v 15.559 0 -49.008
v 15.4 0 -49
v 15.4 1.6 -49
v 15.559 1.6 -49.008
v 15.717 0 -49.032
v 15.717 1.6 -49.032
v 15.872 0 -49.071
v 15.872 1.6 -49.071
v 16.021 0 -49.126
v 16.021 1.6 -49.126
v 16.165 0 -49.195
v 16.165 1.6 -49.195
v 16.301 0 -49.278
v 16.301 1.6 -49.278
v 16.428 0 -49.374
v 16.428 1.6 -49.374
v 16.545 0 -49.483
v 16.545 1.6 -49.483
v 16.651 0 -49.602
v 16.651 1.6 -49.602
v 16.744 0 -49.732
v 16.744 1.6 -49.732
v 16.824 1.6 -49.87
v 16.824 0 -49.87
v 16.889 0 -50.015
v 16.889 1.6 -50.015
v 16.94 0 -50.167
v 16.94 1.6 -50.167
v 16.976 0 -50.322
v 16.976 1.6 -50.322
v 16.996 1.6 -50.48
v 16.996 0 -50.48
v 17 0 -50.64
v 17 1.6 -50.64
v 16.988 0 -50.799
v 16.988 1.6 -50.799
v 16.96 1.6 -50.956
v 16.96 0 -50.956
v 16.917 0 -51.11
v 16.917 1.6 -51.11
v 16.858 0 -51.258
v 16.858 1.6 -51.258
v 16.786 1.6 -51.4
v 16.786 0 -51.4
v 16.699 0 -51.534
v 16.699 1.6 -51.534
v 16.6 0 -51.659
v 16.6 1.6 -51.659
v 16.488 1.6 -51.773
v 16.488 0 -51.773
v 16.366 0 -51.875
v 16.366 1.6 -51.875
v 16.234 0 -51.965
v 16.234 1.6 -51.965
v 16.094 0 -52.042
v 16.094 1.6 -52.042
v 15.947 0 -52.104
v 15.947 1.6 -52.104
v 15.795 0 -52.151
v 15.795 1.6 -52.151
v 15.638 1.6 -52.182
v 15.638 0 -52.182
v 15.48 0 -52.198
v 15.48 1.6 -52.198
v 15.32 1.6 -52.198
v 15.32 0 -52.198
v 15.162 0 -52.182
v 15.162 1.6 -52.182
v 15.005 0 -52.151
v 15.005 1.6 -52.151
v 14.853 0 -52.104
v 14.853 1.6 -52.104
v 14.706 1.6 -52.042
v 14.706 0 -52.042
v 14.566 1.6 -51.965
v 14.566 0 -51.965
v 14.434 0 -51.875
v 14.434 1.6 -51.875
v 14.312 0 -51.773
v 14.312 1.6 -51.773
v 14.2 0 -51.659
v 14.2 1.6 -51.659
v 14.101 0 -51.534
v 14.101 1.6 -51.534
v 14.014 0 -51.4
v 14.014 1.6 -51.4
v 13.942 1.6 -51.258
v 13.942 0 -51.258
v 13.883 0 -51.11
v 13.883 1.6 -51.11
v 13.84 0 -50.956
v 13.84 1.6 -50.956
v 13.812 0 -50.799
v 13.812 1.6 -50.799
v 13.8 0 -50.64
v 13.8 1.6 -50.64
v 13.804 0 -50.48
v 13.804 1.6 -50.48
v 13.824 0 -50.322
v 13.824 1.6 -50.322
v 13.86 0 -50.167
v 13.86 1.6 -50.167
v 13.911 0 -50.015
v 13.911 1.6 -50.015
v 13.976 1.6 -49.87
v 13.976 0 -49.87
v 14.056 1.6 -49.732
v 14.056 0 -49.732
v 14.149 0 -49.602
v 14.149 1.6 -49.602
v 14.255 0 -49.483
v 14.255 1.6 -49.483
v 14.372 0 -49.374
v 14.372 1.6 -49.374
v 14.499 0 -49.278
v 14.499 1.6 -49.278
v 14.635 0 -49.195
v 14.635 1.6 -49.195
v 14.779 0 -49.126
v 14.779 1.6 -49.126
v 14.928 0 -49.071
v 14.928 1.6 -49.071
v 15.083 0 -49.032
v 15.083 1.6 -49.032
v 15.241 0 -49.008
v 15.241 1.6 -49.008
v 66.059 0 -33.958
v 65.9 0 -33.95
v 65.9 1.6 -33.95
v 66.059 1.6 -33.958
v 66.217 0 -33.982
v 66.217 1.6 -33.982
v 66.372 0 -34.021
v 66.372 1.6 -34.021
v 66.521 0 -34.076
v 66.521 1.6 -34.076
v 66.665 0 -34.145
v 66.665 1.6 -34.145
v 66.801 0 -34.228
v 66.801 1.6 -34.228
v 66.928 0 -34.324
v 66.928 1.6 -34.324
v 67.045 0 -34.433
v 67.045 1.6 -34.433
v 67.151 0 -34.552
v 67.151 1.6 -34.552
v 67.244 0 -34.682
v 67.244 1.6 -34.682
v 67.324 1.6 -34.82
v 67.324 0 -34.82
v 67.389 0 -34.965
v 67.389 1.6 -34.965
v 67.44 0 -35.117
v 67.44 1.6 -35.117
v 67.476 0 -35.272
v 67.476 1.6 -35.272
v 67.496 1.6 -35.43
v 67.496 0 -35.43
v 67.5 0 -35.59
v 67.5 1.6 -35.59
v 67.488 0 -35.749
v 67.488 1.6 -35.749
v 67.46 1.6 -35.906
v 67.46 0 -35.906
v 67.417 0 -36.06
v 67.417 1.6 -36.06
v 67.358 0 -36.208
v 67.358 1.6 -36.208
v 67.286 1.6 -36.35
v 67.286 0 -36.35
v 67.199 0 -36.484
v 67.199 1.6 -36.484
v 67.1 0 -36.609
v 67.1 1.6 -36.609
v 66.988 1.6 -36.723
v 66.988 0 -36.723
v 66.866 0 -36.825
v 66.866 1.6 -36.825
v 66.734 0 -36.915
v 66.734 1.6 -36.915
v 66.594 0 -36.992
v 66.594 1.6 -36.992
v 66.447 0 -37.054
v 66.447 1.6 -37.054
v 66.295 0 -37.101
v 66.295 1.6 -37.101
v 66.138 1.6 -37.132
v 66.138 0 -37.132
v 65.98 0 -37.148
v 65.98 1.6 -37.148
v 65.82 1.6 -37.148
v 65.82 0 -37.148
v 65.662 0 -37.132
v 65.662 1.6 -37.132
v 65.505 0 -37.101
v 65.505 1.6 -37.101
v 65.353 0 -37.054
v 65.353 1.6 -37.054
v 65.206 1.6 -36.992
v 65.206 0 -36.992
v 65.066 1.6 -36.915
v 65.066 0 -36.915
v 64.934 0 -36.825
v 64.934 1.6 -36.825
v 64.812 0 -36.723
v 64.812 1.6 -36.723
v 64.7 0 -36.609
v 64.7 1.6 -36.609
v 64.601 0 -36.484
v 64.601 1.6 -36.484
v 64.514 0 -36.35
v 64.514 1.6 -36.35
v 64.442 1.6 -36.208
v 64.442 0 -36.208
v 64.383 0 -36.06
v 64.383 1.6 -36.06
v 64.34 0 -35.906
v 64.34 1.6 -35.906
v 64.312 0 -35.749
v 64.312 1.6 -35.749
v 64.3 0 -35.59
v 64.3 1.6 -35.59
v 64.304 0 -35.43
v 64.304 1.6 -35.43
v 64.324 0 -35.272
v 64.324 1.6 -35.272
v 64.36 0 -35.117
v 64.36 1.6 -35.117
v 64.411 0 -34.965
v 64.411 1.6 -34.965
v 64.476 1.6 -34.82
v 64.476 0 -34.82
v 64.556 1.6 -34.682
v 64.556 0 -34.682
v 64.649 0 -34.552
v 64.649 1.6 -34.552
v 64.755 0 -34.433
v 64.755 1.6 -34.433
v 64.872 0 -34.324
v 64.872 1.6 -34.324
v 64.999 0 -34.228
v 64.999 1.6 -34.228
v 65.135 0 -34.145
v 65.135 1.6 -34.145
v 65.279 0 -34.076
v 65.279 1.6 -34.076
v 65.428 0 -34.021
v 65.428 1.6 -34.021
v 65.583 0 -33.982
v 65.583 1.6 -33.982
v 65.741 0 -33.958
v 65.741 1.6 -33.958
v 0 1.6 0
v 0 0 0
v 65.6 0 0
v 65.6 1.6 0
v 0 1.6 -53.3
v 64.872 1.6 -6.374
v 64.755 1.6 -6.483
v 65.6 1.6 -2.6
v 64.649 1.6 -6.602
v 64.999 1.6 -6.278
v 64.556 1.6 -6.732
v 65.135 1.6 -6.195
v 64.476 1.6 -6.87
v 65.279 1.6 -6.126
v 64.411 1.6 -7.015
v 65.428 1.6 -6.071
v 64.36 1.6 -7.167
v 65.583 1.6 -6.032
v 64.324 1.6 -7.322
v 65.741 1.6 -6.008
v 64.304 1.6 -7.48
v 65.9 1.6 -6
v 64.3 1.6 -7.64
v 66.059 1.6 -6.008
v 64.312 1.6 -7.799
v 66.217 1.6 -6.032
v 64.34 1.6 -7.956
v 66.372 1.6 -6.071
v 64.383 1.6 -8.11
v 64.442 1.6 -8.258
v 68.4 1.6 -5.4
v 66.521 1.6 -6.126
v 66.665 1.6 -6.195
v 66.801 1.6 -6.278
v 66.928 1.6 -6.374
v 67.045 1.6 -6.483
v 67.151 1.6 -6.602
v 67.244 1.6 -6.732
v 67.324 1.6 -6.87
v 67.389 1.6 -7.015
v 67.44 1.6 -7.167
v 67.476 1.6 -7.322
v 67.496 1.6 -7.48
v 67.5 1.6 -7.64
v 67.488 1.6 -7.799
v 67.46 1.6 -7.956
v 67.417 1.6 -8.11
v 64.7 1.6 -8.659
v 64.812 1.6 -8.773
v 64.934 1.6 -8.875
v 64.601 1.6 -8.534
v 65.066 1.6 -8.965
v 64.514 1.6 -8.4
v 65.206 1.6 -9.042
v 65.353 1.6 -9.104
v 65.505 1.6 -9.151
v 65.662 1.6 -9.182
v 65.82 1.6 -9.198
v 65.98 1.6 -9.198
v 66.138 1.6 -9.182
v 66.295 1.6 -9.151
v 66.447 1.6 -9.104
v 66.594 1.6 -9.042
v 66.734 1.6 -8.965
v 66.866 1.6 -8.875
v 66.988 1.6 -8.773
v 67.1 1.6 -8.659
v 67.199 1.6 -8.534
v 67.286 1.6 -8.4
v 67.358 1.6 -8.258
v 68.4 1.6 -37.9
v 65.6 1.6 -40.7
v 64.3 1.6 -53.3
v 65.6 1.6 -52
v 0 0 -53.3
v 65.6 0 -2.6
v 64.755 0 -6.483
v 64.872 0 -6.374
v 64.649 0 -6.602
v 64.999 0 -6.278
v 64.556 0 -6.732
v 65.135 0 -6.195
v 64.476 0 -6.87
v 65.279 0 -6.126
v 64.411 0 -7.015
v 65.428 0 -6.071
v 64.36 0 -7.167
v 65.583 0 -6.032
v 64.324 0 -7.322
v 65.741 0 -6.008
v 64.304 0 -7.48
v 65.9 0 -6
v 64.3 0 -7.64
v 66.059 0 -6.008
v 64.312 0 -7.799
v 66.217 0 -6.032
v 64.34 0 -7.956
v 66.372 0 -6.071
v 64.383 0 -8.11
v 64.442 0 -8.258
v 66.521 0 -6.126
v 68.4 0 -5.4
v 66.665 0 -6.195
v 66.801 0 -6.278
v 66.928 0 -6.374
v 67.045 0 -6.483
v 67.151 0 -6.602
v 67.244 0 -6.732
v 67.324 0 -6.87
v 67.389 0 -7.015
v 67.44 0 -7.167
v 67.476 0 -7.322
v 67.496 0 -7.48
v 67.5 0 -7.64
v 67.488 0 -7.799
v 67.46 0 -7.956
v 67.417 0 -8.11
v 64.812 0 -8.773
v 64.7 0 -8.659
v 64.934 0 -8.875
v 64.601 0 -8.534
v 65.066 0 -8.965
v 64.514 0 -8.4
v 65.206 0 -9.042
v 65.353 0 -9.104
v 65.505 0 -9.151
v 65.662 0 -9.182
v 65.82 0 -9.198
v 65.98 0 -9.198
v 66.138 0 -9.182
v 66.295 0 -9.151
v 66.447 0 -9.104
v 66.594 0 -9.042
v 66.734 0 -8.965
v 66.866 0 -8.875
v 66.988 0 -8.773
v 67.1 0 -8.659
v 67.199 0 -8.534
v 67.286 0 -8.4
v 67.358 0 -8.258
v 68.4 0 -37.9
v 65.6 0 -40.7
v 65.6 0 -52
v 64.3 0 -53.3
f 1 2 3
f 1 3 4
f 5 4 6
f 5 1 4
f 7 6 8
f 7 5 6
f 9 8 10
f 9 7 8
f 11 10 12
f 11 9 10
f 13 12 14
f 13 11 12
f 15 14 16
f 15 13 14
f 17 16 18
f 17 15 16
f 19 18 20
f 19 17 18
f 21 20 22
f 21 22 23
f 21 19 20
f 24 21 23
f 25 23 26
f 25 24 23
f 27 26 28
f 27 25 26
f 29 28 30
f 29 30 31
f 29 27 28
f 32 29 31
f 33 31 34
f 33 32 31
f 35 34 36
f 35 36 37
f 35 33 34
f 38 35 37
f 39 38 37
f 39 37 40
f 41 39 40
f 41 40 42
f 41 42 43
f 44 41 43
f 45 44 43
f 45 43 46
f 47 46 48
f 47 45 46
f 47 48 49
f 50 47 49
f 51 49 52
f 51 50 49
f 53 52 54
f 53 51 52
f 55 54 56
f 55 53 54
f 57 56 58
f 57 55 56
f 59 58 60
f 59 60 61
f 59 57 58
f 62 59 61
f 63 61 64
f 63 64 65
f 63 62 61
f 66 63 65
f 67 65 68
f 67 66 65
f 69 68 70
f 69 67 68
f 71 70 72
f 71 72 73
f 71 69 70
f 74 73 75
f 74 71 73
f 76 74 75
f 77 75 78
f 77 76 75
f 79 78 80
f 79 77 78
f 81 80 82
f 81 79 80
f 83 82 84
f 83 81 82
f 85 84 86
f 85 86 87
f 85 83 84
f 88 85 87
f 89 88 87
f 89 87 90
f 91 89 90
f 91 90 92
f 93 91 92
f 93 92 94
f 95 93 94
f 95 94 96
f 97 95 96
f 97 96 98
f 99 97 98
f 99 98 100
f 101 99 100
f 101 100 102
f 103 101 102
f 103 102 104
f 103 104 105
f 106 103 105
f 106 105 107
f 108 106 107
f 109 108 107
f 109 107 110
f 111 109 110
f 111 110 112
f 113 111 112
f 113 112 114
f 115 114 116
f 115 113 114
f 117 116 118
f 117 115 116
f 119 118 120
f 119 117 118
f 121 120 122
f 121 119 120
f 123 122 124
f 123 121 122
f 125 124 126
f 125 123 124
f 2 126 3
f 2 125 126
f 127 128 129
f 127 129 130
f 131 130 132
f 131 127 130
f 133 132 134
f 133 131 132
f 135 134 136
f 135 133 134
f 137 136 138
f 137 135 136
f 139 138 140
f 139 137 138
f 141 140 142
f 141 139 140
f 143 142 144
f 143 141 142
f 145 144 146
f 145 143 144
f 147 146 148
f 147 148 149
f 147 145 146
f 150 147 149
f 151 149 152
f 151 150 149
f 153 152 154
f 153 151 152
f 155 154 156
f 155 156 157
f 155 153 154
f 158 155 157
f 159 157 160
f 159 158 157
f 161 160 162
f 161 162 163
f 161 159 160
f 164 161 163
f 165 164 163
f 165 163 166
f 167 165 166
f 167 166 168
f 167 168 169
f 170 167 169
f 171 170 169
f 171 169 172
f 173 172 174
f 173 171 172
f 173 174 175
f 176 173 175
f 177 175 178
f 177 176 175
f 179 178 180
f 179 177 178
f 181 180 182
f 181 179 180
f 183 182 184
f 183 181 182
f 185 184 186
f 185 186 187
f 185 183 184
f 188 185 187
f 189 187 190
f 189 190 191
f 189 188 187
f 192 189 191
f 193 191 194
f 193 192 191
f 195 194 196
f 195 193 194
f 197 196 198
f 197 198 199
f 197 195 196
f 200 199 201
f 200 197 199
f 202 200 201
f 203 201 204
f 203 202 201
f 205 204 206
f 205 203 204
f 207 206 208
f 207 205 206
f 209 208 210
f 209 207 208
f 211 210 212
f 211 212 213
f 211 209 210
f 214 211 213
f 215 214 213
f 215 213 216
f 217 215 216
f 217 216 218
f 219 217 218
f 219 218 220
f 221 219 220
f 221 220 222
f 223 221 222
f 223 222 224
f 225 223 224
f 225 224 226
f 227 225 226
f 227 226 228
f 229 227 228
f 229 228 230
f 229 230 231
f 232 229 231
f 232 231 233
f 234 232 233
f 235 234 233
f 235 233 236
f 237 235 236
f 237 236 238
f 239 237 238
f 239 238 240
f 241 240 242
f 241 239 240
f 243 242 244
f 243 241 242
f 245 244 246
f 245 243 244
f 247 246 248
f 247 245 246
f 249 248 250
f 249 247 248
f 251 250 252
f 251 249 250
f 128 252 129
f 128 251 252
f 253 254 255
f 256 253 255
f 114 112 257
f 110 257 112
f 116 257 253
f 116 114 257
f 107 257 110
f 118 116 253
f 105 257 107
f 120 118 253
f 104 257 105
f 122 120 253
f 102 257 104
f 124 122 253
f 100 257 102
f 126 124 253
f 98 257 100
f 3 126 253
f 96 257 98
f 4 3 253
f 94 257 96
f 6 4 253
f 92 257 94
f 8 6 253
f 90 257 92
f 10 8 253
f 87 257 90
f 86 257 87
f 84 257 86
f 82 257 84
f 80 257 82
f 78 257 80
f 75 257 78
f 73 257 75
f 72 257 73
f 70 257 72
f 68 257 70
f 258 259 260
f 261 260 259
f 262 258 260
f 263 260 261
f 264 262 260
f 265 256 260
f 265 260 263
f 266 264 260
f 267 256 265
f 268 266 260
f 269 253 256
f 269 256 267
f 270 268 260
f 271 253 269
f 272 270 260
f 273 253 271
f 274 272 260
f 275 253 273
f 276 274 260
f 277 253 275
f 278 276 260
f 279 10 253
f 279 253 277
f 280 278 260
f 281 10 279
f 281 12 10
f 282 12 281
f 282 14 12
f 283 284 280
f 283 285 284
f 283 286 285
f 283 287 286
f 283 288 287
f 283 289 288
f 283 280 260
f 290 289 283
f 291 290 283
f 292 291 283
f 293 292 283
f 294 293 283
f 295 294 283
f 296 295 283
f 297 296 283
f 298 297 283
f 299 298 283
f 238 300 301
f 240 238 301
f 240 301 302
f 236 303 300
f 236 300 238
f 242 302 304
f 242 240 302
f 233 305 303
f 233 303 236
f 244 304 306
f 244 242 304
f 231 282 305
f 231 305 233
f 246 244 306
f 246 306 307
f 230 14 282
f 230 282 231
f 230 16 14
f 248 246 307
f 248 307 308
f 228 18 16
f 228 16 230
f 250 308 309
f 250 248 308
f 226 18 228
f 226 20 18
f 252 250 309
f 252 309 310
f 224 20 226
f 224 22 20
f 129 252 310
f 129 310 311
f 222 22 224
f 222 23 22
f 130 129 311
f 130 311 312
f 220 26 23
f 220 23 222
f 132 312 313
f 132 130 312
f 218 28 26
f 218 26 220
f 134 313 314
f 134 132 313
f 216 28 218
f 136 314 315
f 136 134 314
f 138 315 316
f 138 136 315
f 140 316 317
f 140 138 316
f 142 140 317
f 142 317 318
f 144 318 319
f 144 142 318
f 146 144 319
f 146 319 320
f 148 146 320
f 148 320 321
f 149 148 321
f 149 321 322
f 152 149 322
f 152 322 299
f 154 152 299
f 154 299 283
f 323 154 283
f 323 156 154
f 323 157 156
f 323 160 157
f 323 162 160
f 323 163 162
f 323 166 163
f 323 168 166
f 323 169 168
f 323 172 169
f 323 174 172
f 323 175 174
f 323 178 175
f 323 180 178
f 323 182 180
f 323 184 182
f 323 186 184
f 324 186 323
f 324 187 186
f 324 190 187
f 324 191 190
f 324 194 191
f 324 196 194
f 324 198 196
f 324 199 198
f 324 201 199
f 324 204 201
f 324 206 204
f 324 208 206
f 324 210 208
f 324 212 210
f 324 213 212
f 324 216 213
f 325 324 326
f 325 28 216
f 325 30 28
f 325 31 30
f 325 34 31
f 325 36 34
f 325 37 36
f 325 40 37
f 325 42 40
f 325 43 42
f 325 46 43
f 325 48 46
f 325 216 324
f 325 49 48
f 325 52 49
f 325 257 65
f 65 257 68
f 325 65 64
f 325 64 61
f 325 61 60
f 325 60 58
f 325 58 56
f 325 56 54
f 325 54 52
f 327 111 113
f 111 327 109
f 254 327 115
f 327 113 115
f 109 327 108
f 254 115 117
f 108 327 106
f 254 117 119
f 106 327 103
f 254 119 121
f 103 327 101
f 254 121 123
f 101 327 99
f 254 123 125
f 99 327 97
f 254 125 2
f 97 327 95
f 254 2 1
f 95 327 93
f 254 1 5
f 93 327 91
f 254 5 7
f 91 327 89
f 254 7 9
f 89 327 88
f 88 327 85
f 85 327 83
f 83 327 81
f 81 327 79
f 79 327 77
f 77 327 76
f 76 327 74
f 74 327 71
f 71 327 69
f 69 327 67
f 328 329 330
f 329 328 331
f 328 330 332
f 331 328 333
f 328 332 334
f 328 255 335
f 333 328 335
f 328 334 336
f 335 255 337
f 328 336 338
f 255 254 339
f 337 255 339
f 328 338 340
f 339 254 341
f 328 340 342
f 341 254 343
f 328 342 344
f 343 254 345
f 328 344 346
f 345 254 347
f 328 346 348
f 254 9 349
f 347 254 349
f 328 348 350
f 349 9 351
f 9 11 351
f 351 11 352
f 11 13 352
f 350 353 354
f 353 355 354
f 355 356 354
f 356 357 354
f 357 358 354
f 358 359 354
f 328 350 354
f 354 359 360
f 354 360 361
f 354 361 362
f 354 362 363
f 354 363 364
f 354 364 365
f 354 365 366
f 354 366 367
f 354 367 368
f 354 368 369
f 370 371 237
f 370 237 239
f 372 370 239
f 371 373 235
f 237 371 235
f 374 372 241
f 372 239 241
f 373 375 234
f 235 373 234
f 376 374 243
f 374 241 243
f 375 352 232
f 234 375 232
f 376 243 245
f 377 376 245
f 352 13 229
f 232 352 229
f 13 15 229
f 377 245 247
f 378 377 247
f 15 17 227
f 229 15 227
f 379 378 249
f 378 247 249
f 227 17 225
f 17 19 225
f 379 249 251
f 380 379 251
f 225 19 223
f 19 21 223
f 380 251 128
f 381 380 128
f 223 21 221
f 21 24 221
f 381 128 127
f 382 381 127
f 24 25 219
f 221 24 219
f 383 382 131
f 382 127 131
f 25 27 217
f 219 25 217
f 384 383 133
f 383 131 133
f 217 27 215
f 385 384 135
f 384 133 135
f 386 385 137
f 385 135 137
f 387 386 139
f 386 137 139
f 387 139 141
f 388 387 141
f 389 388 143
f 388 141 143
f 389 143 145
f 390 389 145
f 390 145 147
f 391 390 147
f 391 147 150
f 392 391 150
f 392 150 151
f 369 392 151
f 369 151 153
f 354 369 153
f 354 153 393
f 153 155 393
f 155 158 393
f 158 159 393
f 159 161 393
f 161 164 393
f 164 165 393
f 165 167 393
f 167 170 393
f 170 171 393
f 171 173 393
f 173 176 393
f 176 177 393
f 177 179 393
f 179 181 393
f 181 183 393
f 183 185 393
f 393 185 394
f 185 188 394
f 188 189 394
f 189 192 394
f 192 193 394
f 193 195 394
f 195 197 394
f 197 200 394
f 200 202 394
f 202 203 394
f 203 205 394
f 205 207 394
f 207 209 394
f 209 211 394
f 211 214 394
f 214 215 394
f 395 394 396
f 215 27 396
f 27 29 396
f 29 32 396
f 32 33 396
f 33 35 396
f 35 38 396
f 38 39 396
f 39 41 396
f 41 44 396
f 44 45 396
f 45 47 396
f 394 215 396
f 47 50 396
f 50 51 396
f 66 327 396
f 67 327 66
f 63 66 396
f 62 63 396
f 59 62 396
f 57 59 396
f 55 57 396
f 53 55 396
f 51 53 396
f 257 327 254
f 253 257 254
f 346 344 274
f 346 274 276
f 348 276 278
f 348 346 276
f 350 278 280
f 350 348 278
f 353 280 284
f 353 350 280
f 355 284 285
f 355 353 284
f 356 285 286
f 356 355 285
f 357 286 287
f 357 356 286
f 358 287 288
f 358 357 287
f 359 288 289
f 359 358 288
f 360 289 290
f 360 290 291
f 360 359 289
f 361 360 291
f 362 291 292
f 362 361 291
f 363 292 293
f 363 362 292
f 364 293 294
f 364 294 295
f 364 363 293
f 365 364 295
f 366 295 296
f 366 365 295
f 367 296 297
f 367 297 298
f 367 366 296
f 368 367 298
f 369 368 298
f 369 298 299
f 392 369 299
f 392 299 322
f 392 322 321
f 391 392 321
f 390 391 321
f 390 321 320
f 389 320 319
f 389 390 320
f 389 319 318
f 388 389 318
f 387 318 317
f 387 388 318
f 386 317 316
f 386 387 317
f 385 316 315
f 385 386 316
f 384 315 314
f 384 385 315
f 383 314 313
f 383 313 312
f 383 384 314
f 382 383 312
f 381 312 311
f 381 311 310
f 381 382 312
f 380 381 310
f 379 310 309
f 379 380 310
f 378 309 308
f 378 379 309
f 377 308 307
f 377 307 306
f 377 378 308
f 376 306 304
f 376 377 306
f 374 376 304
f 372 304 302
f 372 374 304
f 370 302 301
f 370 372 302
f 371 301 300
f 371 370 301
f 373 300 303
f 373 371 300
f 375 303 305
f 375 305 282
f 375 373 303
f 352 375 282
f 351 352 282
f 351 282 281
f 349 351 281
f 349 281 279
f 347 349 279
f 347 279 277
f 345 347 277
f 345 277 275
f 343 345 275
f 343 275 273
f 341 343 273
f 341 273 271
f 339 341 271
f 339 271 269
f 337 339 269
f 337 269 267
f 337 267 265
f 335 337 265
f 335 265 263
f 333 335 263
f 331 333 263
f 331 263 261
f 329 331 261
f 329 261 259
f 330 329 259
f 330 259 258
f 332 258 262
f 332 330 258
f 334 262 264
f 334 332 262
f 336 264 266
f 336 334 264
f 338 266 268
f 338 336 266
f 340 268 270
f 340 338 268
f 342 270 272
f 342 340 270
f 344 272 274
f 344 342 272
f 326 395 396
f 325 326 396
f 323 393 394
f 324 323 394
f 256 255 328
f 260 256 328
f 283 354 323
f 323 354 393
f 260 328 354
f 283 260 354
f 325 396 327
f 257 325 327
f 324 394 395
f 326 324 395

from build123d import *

# Parameters (mm, degrees)
SKETCH1_R           = 1.6
BOSS_EXTRUDE1_DEPTH = 1.6


with BuildPart() as part:
    # Sketch1 → Boss-Extrude1 (new body)
    with BuildSketch(Plane(origin=(0, 0, 0), x_dir=(1, 0, 0), z_dir=(0, 1, 0))):
        Polygon((65.6, 0), (65.6, 2.6), (68.4, 5.4), (68.4, 37.9), (65.6, 40.7), (65.6, 52), (64.3, 53.3), (0, 53.3), (0, 0), align=None)
        with Locations(Location((65.9, 7.6, 0), (0, 0, 270))):
            Circle(SKETCH1_R, mode=Mode.SUBTRACT)
        with Locations(Location((65.9, 35.55, 0), (0, 0, 270))):
            Circle(SKETCH1_R, mode=Mode.SUBTRACT)
        with Locations(Location((15.4, 50.6, 0), (0, 0, 270))):
            Circle(SKETCH1_R, mode=Mode.SUBTRACT)
    extrude(amount=BOSS_EXTRUDE1_DEPTH)


solid = part.part
